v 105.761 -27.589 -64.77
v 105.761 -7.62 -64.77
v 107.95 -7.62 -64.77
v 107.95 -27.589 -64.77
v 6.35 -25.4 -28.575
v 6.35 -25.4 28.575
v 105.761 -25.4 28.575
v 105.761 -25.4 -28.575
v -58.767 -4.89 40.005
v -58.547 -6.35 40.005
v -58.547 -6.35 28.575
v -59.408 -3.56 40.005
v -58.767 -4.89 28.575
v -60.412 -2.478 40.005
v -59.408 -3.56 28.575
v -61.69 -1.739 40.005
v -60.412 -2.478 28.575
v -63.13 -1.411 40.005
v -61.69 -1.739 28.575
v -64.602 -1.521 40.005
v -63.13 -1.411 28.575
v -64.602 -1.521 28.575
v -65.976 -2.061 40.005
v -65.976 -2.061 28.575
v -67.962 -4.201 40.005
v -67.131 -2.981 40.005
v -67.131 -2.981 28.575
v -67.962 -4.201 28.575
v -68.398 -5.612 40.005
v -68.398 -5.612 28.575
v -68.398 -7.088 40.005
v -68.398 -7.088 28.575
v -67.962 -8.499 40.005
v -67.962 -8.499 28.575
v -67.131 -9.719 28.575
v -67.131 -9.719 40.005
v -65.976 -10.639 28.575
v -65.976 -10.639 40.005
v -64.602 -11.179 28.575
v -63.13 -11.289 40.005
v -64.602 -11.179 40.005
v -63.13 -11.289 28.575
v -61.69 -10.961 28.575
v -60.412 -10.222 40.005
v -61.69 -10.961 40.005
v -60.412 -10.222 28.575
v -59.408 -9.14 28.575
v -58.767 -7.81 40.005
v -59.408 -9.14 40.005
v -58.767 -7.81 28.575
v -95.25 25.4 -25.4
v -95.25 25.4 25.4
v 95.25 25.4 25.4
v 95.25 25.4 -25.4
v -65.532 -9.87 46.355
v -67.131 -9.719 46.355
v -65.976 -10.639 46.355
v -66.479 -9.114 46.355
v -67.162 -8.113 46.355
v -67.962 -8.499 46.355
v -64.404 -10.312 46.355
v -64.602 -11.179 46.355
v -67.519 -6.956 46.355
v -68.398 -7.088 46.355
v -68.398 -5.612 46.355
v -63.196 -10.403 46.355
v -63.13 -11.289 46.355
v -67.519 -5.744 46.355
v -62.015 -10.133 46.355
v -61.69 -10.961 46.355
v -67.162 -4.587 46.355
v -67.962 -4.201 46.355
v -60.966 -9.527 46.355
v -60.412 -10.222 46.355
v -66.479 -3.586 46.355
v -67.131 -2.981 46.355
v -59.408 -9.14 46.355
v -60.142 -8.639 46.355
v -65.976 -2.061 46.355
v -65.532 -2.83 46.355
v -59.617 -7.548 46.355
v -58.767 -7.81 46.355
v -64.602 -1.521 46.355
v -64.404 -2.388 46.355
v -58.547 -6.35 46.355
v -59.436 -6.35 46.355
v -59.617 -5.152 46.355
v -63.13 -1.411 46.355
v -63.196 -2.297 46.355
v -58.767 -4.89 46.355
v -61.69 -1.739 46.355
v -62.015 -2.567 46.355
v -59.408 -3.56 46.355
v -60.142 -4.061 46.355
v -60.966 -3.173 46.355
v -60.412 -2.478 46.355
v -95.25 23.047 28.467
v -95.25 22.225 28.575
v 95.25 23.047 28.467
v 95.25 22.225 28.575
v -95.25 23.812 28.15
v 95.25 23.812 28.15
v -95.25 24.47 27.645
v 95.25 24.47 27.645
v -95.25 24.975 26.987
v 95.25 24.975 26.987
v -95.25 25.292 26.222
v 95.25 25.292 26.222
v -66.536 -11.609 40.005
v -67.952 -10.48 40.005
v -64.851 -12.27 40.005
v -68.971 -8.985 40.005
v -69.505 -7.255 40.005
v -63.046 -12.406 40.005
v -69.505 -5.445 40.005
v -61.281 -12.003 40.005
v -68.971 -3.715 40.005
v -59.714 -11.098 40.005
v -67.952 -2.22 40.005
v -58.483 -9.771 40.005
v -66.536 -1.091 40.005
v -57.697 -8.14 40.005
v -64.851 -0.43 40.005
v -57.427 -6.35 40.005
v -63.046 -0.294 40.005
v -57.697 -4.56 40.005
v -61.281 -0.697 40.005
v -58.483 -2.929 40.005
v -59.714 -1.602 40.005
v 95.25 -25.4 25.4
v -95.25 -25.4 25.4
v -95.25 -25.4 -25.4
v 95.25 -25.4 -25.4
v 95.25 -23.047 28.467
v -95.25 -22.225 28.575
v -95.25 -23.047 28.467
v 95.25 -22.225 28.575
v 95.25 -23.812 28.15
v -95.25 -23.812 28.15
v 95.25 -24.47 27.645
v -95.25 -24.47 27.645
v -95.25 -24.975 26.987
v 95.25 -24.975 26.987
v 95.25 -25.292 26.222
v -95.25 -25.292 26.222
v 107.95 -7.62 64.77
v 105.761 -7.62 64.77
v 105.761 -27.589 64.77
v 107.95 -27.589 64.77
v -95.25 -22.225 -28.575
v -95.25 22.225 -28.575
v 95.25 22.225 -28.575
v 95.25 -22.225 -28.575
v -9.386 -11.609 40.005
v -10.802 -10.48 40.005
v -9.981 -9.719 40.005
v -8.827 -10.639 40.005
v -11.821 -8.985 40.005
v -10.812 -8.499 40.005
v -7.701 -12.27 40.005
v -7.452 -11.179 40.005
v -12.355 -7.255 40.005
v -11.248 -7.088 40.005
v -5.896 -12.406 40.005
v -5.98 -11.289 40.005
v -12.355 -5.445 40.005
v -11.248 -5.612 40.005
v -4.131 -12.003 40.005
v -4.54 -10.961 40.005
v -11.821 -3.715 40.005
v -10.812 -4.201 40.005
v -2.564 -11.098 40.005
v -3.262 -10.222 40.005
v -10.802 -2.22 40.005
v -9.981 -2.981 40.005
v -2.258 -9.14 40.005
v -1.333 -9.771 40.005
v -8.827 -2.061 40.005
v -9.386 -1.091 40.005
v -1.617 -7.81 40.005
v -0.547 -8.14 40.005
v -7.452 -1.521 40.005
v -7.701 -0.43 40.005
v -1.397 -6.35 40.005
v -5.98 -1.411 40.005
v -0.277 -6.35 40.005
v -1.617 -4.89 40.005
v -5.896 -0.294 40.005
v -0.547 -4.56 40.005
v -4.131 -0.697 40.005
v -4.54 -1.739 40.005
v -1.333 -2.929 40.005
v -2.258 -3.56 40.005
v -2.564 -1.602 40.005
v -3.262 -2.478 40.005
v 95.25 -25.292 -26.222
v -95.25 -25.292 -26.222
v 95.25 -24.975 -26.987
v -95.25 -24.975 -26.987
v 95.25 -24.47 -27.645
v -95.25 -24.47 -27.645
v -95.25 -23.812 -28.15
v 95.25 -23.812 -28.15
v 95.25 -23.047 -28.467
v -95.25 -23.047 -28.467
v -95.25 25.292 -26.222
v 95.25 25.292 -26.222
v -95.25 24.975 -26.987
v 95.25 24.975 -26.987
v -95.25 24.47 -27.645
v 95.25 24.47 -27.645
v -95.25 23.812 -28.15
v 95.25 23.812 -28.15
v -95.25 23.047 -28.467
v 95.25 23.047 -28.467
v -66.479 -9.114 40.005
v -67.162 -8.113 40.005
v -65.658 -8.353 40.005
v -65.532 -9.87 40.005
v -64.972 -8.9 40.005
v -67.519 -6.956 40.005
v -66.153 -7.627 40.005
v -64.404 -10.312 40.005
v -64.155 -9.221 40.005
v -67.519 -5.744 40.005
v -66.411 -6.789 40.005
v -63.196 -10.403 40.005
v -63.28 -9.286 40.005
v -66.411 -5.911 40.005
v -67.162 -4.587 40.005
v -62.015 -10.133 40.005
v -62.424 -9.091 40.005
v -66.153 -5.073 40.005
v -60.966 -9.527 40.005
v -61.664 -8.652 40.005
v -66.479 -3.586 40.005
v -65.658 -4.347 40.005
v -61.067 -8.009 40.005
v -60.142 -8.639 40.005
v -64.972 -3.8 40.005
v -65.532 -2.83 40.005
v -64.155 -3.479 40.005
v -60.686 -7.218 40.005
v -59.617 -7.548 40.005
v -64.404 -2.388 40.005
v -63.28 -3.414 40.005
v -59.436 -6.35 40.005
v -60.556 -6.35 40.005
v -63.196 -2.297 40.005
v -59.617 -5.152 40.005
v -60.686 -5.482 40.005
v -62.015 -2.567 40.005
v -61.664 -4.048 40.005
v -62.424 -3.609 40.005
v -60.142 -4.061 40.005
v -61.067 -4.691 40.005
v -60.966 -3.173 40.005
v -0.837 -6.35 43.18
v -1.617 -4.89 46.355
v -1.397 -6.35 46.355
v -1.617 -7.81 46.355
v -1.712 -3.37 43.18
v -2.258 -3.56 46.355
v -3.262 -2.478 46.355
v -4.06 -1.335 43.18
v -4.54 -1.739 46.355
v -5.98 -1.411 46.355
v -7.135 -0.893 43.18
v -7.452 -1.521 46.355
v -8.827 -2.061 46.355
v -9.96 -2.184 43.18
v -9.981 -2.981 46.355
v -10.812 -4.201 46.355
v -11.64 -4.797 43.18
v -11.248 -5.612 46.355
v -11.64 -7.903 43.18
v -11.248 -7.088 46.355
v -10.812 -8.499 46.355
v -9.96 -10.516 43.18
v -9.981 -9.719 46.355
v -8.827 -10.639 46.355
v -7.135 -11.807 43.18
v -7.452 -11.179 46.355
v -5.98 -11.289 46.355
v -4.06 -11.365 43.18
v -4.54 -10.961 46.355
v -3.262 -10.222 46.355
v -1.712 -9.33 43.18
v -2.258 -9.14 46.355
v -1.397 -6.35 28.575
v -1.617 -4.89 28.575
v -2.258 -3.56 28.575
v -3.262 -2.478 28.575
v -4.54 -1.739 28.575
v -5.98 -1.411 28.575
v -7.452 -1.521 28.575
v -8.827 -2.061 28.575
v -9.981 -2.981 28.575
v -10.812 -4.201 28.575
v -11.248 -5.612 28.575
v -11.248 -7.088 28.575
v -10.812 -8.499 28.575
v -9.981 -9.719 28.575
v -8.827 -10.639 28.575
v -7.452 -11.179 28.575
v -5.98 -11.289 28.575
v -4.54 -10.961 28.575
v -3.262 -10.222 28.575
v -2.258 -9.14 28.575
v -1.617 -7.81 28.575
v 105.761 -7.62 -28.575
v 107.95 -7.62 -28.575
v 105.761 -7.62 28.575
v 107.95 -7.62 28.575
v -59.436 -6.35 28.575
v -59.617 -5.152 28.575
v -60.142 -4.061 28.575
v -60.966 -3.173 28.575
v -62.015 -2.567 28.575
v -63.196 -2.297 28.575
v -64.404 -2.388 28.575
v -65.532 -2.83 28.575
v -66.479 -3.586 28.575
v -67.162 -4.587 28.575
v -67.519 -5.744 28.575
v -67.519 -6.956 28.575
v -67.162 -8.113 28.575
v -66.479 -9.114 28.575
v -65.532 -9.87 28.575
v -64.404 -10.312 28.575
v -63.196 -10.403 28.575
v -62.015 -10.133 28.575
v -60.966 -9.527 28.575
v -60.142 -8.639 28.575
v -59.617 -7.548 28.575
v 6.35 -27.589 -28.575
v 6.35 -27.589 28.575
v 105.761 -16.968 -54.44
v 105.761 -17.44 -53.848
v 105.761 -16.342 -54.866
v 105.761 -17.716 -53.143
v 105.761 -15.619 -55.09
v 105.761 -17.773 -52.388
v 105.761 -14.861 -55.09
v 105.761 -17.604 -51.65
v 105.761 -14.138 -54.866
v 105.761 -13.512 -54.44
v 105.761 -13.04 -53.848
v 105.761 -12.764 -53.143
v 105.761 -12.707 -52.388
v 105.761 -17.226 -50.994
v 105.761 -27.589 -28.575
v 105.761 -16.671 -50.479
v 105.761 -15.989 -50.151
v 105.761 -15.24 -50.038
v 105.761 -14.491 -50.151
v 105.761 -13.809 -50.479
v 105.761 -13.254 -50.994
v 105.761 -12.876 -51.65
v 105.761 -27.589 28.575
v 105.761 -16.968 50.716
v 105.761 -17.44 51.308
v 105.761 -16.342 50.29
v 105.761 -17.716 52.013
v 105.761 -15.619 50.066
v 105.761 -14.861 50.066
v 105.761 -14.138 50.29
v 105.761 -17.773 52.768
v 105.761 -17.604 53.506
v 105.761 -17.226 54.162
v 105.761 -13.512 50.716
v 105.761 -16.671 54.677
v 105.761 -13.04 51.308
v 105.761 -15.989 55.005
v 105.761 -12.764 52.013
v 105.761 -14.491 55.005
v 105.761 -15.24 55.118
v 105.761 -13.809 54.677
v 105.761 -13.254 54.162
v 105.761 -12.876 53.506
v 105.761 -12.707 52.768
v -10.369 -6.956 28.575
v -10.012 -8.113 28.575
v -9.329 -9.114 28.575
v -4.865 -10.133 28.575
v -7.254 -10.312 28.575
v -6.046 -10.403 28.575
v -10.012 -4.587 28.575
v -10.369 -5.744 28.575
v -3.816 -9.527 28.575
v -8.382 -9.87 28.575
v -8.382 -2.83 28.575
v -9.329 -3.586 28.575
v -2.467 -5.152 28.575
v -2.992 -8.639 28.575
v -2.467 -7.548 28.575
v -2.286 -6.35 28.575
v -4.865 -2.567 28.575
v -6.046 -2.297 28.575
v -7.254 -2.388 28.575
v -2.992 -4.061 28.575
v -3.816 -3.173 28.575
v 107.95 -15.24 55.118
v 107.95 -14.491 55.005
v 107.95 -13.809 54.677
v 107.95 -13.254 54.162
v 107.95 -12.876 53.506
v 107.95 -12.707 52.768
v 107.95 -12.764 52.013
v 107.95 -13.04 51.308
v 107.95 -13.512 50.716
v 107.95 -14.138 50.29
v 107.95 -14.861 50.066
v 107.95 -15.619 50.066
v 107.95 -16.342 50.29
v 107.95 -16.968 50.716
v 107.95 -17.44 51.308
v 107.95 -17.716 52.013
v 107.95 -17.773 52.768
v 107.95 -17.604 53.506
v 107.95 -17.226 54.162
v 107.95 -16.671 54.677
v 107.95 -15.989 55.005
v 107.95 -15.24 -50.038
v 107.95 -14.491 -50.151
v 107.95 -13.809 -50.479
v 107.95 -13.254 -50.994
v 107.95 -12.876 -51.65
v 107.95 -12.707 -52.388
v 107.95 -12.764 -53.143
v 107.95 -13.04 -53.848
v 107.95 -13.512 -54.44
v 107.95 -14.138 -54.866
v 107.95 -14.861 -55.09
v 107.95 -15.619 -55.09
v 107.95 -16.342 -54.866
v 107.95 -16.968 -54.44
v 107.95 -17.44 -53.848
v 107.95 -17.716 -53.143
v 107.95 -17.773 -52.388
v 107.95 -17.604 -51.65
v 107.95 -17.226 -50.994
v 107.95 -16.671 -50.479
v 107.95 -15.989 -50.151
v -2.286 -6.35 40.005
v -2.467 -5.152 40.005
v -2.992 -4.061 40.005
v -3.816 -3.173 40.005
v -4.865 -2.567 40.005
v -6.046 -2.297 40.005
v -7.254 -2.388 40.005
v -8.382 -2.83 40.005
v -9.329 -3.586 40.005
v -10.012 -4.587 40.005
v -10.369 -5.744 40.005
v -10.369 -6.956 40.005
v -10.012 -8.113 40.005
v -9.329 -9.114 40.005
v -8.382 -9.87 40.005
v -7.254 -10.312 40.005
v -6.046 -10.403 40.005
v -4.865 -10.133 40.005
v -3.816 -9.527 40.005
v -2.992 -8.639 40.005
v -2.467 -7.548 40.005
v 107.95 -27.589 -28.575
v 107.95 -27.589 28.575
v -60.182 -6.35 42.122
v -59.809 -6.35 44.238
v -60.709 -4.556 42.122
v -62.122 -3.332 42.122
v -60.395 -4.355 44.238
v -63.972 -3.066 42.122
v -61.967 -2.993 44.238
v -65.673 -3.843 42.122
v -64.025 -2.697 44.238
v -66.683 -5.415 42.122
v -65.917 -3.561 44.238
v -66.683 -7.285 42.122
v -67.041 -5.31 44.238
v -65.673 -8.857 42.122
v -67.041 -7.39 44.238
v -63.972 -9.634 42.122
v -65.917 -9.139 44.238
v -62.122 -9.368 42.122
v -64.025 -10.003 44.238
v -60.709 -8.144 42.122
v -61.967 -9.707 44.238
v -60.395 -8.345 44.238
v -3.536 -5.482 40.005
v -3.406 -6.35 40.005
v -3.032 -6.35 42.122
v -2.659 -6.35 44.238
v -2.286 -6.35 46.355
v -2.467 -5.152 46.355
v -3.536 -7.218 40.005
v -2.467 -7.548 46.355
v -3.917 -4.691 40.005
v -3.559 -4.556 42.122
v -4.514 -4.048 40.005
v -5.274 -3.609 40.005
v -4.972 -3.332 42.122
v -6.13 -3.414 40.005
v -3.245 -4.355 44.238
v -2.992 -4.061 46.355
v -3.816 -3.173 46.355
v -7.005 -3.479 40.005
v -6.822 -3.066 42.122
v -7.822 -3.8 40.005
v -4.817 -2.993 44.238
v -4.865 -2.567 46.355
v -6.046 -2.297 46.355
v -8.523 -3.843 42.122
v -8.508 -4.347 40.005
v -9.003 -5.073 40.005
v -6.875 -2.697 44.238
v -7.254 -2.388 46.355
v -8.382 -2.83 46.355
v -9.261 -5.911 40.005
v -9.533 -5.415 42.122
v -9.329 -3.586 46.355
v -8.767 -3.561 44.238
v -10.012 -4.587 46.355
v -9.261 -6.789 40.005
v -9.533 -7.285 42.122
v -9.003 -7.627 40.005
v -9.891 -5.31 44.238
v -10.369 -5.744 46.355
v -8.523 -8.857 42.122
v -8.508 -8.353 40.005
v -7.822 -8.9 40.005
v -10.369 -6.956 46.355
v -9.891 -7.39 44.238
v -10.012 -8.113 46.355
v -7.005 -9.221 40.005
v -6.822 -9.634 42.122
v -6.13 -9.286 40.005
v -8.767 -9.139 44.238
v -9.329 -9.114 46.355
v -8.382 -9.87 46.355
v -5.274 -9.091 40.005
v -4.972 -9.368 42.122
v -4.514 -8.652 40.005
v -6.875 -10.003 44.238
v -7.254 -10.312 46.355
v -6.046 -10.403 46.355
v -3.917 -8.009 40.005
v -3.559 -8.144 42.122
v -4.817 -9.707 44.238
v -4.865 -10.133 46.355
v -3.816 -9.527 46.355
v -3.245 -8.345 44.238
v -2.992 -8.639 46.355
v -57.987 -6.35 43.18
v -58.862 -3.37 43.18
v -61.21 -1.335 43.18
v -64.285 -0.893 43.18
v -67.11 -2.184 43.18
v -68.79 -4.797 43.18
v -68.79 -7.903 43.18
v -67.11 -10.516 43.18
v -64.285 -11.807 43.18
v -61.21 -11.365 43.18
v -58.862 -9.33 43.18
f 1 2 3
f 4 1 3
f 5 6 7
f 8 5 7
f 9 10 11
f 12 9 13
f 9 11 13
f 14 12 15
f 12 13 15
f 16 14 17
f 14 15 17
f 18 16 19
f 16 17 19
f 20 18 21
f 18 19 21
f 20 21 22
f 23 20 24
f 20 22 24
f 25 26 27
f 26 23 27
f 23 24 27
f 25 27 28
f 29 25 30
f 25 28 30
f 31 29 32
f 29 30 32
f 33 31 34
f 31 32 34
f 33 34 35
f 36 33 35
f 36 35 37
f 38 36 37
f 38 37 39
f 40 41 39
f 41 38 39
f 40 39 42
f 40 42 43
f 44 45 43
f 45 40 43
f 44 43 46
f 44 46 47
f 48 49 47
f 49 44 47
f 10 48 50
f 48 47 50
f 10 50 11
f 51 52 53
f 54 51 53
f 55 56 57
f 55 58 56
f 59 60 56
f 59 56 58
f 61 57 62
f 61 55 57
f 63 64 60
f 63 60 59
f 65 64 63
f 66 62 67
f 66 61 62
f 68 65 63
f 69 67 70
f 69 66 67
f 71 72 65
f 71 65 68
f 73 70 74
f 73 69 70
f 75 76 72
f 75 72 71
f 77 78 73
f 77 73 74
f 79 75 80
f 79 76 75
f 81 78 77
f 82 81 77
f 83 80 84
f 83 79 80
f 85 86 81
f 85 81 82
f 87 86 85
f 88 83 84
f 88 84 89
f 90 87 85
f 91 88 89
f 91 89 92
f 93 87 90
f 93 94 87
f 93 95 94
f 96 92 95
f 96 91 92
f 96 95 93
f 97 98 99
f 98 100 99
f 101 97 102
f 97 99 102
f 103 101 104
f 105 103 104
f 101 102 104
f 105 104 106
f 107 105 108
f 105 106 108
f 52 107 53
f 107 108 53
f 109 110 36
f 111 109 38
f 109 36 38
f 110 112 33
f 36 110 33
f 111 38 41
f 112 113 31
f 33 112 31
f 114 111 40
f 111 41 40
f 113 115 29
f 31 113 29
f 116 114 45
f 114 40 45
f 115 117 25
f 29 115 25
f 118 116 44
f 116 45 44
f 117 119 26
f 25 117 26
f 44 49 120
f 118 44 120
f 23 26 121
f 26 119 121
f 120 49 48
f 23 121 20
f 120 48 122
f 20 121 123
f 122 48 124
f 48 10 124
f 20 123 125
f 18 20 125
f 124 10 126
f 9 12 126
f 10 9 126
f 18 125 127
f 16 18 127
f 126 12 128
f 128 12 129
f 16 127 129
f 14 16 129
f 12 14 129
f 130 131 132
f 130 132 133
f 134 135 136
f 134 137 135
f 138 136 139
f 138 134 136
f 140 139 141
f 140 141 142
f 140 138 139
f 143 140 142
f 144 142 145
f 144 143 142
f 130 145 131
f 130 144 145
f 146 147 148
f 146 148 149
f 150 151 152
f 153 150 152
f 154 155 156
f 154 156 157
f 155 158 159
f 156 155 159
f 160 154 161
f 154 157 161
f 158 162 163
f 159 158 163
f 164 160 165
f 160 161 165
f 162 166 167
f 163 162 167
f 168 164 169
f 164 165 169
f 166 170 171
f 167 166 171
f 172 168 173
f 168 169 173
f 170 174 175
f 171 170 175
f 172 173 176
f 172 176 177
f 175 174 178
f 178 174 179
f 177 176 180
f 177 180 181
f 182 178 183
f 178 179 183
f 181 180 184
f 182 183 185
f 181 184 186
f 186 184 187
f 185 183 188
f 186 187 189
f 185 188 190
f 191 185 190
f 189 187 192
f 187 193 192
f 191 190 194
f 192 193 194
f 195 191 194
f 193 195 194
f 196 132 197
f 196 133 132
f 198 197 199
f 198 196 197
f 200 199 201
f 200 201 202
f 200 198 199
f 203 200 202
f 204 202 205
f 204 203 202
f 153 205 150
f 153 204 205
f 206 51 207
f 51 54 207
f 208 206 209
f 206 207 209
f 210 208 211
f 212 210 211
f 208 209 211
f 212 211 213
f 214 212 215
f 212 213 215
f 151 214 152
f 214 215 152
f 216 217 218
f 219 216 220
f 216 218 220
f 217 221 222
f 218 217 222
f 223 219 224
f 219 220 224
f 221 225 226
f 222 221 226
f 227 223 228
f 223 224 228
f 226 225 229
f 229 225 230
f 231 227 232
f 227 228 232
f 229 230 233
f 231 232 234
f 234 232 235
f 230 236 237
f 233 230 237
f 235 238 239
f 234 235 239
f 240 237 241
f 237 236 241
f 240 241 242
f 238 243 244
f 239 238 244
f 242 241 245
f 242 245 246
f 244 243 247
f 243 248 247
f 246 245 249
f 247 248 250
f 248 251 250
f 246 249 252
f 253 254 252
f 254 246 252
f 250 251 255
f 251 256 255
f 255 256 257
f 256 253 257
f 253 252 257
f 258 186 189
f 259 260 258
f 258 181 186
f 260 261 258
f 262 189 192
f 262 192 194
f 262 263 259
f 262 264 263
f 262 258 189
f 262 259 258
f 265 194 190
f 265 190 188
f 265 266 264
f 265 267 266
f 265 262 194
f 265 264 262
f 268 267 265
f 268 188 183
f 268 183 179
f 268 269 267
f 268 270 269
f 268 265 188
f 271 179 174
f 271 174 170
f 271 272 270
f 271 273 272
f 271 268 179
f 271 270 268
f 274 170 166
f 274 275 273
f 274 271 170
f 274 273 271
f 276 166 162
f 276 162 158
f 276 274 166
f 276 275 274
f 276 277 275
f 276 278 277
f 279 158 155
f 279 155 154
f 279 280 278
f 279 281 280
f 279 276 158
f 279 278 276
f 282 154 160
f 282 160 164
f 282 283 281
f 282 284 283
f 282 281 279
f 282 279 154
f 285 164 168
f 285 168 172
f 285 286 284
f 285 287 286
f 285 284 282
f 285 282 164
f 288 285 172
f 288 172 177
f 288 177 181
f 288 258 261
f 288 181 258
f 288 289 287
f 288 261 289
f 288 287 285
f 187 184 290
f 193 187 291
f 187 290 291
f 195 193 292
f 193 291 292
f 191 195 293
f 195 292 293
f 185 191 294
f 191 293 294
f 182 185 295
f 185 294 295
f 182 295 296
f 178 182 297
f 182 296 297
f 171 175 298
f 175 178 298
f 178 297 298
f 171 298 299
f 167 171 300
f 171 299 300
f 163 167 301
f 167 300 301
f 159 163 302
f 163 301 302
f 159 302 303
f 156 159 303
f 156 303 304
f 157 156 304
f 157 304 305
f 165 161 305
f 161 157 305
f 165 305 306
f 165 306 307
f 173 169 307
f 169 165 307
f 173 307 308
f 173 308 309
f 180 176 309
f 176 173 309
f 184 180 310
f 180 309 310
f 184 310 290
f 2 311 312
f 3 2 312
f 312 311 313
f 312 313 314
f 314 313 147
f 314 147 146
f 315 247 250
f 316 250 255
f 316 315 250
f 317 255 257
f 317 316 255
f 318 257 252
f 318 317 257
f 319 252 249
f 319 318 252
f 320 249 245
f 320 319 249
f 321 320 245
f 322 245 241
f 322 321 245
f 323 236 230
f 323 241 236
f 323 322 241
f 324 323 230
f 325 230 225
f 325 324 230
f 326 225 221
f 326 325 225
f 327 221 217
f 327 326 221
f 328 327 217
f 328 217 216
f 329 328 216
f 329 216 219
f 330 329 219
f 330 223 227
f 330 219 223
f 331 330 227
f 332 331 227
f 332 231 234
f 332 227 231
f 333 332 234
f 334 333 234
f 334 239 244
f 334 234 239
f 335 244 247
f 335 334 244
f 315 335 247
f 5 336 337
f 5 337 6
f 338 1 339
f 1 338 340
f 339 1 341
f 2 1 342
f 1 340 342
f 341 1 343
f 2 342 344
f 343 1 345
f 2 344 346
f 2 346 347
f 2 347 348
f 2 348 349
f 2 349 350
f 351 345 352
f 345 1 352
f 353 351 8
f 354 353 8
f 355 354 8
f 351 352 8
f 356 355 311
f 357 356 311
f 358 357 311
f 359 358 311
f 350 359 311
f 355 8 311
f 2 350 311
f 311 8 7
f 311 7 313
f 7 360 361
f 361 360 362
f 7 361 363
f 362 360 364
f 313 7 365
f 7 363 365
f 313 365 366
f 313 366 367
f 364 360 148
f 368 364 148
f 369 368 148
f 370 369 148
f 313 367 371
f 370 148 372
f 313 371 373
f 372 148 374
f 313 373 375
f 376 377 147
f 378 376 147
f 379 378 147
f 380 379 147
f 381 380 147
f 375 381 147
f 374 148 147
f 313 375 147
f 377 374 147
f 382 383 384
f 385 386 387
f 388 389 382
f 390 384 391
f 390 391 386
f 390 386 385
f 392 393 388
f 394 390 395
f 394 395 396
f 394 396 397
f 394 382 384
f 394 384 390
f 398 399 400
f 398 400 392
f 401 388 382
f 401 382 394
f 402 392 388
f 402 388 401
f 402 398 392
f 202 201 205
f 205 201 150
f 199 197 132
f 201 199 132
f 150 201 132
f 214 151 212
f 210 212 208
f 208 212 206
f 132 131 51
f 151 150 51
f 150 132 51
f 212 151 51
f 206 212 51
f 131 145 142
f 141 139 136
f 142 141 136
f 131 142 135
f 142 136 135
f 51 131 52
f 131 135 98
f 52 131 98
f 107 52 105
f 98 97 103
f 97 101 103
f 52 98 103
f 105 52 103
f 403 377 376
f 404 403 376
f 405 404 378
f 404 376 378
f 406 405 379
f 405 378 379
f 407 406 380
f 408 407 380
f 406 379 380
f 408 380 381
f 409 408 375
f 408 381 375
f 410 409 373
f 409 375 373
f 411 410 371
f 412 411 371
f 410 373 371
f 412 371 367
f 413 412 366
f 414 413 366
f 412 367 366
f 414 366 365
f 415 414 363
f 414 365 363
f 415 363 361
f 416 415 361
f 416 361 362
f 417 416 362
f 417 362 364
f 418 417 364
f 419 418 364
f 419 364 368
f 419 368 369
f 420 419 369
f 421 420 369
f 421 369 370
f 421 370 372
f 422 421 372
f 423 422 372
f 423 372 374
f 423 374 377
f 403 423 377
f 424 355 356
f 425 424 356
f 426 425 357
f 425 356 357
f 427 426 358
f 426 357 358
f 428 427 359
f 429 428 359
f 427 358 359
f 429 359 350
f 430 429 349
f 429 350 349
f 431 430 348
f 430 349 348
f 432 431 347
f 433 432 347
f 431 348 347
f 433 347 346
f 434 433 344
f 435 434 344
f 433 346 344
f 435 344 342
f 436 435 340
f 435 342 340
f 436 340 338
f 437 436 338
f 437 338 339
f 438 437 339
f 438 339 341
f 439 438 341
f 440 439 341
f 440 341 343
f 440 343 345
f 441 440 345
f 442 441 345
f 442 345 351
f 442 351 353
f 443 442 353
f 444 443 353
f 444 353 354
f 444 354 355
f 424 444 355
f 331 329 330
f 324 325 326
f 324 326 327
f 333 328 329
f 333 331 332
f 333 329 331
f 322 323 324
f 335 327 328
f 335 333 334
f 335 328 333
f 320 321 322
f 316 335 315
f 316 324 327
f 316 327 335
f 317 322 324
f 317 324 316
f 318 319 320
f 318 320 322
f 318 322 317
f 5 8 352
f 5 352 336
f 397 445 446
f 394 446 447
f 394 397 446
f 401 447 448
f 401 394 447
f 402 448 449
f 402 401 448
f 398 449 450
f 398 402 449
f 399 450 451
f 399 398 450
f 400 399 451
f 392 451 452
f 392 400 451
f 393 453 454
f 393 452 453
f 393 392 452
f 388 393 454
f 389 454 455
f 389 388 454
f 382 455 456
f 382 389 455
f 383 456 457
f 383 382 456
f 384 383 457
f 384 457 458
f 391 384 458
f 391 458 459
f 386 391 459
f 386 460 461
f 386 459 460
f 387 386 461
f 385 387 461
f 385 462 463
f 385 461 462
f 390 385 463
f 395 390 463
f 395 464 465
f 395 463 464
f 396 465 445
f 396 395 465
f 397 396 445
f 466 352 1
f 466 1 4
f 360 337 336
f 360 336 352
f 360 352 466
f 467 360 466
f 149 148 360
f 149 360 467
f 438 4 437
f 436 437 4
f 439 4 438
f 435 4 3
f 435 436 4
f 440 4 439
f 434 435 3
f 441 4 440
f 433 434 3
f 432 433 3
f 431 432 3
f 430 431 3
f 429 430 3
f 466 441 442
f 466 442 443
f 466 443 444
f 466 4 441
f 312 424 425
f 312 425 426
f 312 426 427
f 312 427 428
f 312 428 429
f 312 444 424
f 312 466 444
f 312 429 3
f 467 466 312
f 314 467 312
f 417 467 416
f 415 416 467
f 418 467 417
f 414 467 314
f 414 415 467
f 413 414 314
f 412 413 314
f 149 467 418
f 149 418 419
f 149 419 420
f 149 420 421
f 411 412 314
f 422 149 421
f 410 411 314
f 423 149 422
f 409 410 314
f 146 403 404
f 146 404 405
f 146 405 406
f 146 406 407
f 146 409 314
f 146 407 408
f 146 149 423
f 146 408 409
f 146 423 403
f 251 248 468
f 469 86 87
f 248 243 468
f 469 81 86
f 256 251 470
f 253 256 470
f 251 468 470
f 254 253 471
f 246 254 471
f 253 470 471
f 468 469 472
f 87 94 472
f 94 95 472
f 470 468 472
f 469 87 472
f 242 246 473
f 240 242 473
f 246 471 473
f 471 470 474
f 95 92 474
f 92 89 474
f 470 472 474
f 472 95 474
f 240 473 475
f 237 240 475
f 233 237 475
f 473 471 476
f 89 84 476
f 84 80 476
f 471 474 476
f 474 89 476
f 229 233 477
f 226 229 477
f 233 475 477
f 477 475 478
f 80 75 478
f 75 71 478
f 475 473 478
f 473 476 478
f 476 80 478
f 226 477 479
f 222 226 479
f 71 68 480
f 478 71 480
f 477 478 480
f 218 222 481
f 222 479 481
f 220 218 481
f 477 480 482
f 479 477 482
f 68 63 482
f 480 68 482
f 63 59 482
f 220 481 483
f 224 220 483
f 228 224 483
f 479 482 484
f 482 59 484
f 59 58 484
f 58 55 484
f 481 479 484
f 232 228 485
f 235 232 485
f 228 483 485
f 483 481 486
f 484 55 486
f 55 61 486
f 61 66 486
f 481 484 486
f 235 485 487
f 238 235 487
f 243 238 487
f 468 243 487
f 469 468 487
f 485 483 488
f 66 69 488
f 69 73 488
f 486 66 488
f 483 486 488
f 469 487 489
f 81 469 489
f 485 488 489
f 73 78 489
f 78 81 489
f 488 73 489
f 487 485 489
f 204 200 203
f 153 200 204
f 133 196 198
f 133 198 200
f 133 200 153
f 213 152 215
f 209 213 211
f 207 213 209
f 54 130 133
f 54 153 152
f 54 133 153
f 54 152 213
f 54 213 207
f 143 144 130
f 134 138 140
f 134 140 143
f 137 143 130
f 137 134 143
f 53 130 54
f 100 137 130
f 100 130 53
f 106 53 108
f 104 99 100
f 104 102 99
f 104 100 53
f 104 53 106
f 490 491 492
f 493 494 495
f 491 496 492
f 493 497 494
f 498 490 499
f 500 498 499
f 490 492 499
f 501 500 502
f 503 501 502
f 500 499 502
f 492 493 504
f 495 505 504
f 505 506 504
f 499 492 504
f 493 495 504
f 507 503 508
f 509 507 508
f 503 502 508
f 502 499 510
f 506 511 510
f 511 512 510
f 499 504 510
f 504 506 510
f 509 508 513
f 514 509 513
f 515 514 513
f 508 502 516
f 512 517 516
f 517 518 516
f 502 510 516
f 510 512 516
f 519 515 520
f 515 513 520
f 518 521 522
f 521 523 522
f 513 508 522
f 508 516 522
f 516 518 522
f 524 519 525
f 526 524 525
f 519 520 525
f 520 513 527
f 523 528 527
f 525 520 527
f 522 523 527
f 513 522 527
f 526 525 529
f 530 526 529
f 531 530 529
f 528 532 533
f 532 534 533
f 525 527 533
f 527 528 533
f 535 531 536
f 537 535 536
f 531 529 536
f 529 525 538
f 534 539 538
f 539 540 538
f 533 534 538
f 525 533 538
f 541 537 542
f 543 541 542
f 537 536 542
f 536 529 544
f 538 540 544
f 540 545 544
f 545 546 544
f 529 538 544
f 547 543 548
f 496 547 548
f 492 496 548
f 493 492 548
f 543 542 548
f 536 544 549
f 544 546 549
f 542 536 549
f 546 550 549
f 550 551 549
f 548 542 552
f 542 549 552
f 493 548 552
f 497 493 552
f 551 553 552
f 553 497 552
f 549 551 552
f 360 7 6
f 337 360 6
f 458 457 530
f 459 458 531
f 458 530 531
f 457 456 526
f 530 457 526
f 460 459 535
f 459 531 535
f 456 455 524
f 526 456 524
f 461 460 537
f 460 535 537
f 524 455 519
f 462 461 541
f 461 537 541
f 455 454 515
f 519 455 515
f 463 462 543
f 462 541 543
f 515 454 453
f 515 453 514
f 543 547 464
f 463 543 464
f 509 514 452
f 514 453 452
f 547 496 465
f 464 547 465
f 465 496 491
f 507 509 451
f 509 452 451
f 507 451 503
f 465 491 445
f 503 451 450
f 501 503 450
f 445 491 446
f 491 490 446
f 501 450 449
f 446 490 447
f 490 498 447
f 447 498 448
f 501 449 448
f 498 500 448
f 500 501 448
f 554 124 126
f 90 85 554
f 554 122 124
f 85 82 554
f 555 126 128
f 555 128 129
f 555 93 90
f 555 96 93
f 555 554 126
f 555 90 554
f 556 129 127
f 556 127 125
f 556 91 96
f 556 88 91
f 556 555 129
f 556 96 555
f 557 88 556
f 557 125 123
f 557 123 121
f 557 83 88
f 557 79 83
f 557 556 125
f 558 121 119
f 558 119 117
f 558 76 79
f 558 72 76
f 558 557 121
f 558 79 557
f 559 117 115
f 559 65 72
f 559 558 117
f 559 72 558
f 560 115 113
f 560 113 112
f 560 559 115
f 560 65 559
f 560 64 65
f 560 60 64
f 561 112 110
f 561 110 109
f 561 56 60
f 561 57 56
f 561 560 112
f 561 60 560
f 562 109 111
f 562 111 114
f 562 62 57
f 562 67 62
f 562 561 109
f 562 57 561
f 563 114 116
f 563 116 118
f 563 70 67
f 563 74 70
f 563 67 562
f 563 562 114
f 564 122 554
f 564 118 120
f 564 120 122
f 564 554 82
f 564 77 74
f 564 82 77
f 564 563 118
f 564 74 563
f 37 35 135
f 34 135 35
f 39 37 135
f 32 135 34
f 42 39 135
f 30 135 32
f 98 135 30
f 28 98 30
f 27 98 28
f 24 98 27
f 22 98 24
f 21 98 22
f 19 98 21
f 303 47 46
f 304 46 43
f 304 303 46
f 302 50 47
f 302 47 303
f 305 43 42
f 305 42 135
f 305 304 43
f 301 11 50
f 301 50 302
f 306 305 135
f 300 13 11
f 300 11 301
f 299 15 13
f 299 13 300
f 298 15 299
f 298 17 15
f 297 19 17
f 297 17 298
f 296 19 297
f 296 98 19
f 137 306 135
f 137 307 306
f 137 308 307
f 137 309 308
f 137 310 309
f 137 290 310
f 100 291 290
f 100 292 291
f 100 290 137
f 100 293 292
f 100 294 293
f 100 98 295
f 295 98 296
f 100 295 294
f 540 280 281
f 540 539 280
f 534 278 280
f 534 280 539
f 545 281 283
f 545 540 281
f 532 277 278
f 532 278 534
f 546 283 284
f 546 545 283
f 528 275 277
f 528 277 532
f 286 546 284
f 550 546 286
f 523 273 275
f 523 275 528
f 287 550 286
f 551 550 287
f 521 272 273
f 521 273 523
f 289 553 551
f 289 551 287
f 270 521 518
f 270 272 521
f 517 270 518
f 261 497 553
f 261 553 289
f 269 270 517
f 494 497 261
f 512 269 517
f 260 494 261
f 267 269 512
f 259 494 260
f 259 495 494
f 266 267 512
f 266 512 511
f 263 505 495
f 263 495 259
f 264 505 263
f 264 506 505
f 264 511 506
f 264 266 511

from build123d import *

# Parameters (mm, degrees)
SKETCH1_W                     = 190.5
SKETCH1_H                     = 50.8
BOSS_EXTRUDE1_DEPTH           = 28.575
SKETCH2_R                     = 4.953
SKETCH2_R_2                   = 4.064
BOSS_EXTRUDE2_DEPTH           = 17.78
SKETCH3_R                     = 4.953
SKETCH3_R_2                   = 4.064
BOSS_EXTRUDE3_DEPTH           = 6.35
BOSS_EXTRUDE3_DRAFT           = 10
BOSS_EXTRUDE3_PROFILE_2_DEPTH = 6.35
BOSS_EXTRUDE3_PROFILE_2_DRAFT = 10
BOSS_EXTRUDE4_DEPTH           = 57.15
SKETCH7_W                     = 2.188600317
SKETCH7_H                     = 19.968600317
BOSS_EXTRUDE5_DEPTH           = 64.77
SKETCH8_R                     = 2.54
CUT_EXTRUDE1_DEPTH            = 213.983254201
FILLET1_R                     = 3.175


with BuildPart() as part:
    # Sketch1 → Boss-Extrude1 (new, symmetric)
    with BuildSketch(Plane.XY):
        Rectangle(SKETCH1_W, SKETCH1_H)
    extrude(amount=BOSS_EXTRUDE1_DEPTH, both=True)

    # Sketch2 → Boss-Extrude2 (add)
    # profile 1 of 2: a face of its own
    with BuildSketch(Plane.XY.offset(28.575)):
        with Locations((-63.5, -6.35)):
            Circle(SKETCH2_R)
        with Locations((-63.5, -6.35)):
            Circle(SKETCH2_R_2, mode=Mode.SUBTRACT)
    # profile 2 of 2: a face of its own
    with BuildSketch(Plane.XY.offset(28.575)):
        with Locations((-6.35, -6.35)):
            Circle(SKETCH2_R)
        with Locations((-6.35, -6.35)):
            Circle(SKETCH2_R_2, mode=Mode.SUBTRACT)
    extrude(amount=BOSS_EXTRUDE2_DEPTH)


with BuildPart() as boss_extrude3_tool:
    # Sketch3 → Boss-Extrude3 (with draft: the straight prism first)
    with BuildSketch(Plane.XY.offset(46.355)):
        with Locations((-63.5, -6.35)):
            Circle(SKETCH3_R)
        with Locations((-63.5, -6.35)):
            Circle(SKETCH3_R_2, mode=Mode.SUBTRACT)
    extrude(amount=-BOSS_EXTRUDE3_DEPTH)
    # Boss-Extrude3: the draft: its side faces are tilted about the plane it starts from
    boss_extrude3_sides = [boss_extrude3_tool.faces().sort_by_distance(p)[0] for p in [
        (-68.453, -6.35, 43.18),
        (-67.564, -6.35, 43.18),
    ]]
    draft(boss_extrude3_sides, Plane.XY.offset(46.355), BOSS_EXTRUDE3_DRAFT)


with BuildPart() as part_1:
    add(part.part)

    # Boss-Extrude3: add boss_extrude3_tool
    add(boss_extrude3_tool.part)


with BuildPart() as boss_extrude3_profile_2_tool:
    # Sketch3 → Boss-Extrude3 profile 2 (with draft: the straight prism first)
    with BuildSketch(Plane.XY.offset(46.355)):
        with Locations((-6.35, -6.35)):
            Circle(SKETCH3_R)
        with Locations((-6.35, -6.35)):
            Circle(SKETCH3_R_2, mode=Mode.SUBTRACT)
    extrude(amount=-BOSS_EXTRUDE3_PROFILE_2_DEPTH)
    # Boss-Extrude3 profile 2: the draft: its side faces are tilted about the plane it starts from
    boss_extrude3_profile_2_sides = [boss_extrude3_profile_2_tool.faces().sort_by_distance(p)[0] for p in [
        (-11.303, -6.35, 43.18),
        (-10.414, -6.35, 43.18),
    ]]
    draft(boss_extrude3_profile_2_sides, Plane.XY.offset(46.355), BOSS_EXTRUDE3_PROFILE_2_DRAFT)


with BuildPart() as part_2:
    add(part_1.part)

    # Boss-Extrude3 profile 2: add boss_extrude3_profile_2_tool
    add(boss_extrude3_profile_2_tool.part)

    # Fillet1
    fillet1_edges = [part_2.edges().sort_by_distance(p)[0] for p in [
        (0, -25.4, 28.575),
        (0, -25.4, -28.575),
        (0, 25.4, -28.575),
        (0, 25.4, 28.575),
    ]]
    fillet(fillet1_edges, radius=FILLET1_R)


with BuildPart() as body_2:
    # Sketch5 → Boss-Extrude4 (new body)
    with BuildSketch(Plane.XY.offset(28.575)):
        Polygon((6.35, -25.4), (105.761399683, -25.4), (105.761399683, -7.62), (107.95, -7.62), (107.95, -25.4), (107.95, -27.588600317), (6.35, -27.588600317), align=None)
    extrude(amount=-BOSS_EXTRUDE4_DEPTH)

    # Sketch7 → Boss-Extrude5 (add, symmetric)
    with BuildSketch(Plane.XY):
        with Locations((106.855699842, -17.604300158)):
            Rectangle(SKETCH7_W, SKETCH7_H)
    extrude(amount=BOSS_EXTRUDE5_DEPTH, both=True)

    # Sketch8 → Cut-Extrude1 (cut, through all)
    with BuildSketch(Plane.ZY.offset(-105.761399683)):
        with Locations((52.578, -15.24)):
            Circle(SKETCH8_R)
        with Locations((-52.578, -15.24)):
            Circle(SKETCH8_R)
    extrude(amount=-CUT_EXTRUDE1_DEPTH, mode=Mode.SUBTRACT)


solid = Compound([part_2.part, body_2.part])
